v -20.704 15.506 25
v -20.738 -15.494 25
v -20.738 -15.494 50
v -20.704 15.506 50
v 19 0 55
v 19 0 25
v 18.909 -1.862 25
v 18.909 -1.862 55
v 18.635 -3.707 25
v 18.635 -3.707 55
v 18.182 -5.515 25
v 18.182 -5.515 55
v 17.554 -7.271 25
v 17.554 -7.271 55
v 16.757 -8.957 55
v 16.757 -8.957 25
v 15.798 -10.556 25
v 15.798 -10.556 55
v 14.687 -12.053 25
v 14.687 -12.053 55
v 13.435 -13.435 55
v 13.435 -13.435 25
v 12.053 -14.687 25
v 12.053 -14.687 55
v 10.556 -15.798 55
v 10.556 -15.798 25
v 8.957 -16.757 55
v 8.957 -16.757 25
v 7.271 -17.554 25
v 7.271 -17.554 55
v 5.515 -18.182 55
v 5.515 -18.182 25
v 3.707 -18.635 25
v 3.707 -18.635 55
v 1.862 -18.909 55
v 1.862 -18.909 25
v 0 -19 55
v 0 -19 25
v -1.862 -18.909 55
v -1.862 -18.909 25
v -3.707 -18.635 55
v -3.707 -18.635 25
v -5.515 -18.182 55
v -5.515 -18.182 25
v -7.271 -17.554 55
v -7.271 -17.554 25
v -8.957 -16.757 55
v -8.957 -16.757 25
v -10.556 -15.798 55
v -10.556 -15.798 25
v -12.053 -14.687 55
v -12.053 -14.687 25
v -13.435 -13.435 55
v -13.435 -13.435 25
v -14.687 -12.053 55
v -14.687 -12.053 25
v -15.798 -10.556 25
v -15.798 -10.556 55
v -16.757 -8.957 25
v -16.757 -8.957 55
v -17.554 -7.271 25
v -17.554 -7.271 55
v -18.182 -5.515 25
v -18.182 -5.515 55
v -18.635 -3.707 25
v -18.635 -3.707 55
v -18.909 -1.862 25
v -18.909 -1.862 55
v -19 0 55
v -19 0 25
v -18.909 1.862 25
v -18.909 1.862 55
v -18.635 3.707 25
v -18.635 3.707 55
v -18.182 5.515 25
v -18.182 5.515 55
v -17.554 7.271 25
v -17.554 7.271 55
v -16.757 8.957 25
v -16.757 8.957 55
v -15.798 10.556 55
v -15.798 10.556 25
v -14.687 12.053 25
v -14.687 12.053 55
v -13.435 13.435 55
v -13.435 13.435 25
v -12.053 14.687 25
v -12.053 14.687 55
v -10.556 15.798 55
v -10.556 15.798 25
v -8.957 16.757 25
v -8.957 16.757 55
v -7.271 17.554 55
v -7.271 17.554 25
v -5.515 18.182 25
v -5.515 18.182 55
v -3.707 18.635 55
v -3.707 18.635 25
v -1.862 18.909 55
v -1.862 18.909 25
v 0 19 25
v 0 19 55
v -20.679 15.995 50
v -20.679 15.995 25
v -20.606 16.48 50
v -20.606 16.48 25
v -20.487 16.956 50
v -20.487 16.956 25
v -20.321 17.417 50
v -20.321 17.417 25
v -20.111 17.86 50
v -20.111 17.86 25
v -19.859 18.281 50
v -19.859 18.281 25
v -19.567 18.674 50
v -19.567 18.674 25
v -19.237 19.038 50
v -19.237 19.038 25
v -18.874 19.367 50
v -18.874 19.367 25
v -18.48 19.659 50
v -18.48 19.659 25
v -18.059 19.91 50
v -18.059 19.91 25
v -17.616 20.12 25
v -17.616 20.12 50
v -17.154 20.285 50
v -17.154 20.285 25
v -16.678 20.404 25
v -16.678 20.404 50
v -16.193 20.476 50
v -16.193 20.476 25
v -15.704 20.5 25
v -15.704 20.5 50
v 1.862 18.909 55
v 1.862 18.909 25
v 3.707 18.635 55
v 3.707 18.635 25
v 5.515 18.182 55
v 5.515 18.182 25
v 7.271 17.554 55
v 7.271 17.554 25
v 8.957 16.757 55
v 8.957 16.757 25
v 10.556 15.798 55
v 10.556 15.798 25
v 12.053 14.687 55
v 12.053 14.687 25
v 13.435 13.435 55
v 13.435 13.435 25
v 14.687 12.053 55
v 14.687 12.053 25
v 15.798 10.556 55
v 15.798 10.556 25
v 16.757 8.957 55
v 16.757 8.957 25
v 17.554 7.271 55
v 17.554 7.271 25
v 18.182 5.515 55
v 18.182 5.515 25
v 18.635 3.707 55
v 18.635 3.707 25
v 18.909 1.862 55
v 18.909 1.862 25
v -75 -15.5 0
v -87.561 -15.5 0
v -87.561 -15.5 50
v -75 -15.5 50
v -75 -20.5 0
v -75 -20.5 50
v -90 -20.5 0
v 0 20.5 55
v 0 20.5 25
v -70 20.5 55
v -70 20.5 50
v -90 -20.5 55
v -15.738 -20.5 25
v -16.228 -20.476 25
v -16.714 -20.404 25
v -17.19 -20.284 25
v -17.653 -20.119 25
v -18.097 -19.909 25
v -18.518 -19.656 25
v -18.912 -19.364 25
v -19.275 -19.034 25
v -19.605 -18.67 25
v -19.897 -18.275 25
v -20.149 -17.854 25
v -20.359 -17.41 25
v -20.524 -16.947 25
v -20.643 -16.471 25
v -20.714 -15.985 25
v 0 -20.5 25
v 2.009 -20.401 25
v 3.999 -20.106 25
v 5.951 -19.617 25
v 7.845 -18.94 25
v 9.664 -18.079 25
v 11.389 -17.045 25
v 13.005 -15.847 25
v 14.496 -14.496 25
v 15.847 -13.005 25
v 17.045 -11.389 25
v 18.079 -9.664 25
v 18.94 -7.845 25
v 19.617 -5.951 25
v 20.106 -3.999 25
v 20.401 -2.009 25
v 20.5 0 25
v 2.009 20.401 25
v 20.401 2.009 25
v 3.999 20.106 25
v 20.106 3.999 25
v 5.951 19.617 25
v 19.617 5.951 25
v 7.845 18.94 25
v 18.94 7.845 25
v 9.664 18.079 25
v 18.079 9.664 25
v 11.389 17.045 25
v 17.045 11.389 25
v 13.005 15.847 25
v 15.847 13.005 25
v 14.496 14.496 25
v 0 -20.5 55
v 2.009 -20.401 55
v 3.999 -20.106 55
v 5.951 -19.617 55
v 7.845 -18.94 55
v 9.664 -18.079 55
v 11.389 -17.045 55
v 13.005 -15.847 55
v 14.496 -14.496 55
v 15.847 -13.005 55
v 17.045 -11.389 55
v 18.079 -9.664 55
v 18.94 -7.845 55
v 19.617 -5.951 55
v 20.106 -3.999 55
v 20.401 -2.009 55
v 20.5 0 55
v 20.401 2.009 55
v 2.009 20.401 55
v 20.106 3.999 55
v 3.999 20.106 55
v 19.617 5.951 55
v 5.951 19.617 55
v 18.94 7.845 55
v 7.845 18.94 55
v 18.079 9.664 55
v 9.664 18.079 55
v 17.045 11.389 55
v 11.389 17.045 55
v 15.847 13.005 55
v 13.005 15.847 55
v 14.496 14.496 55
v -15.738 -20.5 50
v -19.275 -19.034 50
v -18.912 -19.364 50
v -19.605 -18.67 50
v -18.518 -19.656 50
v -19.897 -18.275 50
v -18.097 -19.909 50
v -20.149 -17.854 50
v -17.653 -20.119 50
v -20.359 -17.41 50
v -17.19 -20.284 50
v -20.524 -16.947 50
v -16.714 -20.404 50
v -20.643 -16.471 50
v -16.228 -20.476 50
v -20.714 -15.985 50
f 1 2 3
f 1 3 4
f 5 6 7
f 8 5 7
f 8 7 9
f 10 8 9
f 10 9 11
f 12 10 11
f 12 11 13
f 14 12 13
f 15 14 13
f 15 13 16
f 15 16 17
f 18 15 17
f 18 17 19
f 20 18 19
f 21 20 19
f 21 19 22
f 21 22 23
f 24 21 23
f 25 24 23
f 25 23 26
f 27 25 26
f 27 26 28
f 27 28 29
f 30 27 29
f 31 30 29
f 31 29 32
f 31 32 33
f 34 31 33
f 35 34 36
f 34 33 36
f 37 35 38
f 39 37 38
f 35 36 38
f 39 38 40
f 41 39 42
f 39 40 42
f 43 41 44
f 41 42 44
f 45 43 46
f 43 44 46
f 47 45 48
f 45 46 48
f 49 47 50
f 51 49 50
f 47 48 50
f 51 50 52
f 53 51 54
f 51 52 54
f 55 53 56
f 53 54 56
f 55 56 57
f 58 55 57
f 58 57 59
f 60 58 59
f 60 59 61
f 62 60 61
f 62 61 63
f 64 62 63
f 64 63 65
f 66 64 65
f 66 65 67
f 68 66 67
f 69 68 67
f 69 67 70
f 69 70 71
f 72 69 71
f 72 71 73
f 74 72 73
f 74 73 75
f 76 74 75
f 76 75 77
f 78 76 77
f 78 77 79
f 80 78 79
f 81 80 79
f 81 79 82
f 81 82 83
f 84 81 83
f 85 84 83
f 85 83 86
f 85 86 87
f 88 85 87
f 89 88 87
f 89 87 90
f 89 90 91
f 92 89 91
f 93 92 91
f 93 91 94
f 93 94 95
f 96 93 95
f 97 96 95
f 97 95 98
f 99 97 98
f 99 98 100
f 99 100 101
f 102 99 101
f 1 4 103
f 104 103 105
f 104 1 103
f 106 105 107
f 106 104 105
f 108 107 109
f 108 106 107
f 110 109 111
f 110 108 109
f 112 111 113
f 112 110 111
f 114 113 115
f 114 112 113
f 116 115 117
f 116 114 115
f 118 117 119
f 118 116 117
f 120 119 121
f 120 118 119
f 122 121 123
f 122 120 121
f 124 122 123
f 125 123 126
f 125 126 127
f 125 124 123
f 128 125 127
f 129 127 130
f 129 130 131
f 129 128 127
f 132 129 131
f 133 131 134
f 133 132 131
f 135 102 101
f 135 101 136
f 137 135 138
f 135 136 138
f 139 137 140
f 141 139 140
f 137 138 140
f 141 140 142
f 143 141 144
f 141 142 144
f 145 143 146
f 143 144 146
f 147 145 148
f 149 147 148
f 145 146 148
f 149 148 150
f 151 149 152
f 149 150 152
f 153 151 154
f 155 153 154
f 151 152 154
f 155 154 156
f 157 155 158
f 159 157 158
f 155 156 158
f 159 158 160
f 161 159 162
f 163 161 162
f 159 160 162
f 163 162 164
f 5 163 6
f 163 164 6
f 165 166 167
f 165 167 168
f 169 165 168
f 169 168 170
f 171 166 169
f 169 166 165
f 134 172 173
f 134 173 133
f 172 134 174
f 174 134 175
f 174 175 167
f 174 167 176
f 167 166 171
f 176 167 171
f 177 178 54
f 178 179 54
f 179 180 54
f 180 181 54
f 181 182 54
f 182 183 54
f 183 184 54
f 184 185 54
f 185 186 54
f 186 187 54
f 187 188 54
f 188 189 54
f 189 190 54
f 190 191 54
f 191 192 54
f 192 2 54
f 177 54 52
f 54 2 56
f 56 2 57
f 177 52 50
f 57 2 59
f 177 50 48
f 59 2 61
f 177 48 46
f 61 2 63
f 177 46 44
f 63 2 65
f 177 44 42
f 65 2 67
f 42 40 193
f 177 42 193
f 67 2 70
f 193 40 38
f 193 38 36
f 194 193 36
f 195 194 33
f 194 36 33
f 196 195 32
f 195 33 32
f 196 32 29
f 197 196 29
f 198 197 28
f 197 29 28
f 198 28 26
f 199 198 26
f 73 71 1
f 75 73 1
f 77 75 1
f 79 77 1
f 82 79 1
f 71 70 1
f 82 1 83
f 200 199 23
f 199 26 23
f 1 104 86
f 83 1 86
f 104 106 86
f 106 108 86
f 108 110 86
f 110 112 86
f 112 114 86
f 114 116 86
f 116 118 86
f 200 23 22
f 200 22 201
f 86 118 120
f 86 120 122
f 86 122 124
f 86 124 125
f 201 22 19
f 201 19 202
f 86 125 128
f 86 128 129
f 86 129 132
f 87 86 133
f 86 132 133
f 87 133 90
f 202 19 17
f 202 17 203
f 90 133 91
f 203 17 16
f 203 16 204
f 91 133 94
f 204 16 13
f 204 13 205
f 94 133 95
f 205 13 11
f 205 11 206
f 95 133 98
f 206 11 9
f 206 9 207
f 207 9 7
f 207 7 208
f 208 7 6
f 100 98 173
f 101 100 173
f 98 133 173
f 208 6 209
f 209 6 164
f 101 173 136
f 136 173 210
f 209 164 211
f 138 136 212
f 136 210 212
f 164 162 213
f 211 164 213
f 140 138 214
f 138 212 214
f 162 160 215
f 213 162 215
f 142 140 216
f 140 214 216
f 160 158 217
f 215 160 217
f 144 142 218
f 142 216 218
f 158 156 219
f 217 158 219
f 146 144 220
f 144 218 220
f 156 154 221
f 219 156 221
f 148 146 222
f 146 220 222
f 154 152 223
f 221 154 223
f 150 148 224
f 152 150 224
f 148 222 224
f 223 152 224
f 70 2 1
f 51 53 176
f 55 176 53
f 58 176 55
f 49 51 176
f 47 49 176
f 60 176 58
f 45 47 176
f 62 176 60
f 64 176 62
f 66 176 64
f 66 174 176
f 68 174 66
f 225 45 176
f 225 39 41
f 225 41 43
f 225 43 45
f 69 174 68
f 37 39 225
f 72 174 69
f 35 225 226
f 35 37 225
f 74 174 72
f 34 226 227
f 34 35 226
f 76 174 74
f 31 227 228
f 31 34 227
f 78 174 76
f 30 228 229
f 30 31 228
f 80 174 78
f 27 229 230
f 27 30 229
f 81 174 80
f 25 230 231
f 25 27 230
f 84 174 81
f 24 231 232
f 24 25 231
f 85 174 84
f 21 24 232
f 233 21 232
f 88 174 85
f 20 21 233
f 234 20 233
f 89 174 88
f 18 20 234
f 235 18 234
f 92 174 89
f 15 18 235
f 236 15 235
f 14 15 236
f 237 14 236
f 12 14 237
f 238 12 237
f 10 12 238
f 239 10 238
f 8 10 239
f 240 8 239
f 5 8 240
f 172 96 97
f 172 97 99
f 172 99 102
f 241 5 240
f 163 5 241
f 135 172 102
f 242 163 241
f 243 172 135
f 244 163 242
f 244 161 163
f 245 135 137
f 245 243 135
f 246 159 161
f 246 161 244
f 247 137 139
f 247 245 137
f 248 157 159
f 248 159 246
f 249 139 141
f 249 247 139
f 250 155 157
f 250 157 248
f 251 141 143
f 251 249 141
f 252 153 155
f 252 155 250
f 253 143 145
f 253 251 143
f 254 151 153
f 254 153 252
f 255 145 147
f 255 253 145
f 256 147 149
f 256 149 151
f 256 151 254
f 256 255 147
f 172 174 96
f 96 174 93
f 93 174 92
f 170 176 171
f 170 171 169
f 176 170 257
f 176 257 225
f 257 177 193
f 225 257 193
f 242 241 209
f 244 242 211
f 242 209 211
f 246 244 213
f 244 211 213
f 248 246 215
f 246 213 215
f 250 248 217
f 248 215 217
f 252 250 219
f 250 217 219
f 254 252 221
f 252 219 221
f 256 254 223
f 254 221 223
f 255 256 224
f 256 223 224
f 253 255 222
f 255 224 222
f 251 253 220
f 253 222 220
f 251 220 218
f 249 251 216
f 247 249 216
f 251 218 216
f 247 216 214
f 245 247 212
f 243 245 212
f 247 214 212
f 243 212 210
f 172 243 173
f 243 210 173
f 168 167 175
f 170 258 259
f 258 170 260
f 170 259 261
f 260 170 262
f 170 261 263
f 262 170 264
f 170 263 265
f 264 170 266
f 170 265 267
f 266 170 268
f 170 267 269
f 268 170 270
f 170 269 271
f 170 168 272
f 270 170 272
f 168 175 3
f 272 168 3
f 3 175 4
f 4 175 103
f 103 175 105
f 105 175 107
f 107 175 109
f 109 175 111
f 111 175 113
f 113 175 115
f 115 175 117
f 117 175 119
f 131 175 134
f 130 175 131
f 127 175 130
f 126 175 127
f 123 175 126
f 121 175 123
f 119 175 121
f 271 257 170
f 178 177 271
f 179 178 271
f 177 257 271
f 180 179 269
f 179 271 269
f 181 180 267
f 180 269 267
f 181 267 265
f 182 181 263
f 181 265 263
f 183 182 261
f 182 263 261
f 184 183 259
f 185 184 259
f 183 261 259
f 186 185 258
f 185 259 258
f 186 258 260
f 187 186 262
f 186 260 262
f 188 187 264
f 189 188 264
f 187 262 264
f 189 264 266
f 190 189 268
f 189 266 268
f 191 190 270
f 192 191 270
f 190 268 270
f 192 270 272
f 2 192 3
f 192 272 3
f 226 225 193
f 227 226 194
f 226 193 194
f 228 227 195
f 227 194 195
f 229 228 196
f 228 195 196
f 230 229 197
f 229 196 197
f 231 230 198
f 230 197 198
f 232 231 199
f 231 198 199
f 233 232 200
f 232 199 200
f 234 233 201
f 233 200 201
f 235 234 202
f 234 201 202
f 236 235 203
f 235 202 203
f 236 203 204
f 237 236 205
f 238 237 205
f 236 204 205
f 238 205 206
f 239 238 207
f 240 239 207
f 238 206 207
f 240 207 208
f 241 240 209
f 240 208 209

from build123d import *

# Parameters (mm, degrees)
F1_DEPTH = 55
F3_DEPTH = 50
F4_W     = 46.665443
F4_H     = 57.836632
F5_DEPTH = 25
F6_R     = 5


with BuildPart() as f1:
    # F0 (on Top) → F1 (new body)
    with BuildSketch(Plane.XY):
        with BuildLine():
            ThreePointArc((19, 0), (13.435029, 13.435029), (0, 19))
            ThreePointArc((0, 19), (-13.435029, -13.435029), (19, 0))
        make_face()
        with BuildLine():
            ThreePointArc((0, -20.5), (14.495689, -14.495689), (20.5, 0))
            ThreePointArc((20.5, 0), (14.495689, 14.495689), (0, 20.5))
            ThreePointArc((0, 20.5), (-20.5, 0), (0, -20.5))
        make_face()
        with BuildLine():
            ThreePointArc((19, 0), (-13.435029, -13.435029), (0, 19))
            ThreePointArc((0, 19), (13.435029, 13.435029), (19, 0))
        make_face(mode=Mode.SUBTRACT)
        with BuildLine():
            ThreePointArc((0, -20.5), (-20.5, 0), (0, 20.5))
            Line((0, 20.5), (-70, 20.5))
            Line((-70, 20.5), (-90, -20.5))
            Line((-90, -20.5), (0, -20.5))
        make_face()
    extrude(amount=F1_DEPTH)

    # F2 (on face) → F3 (cut)
    with BuildSketch(Plane.XY):
        Polygon((-20.693906, 24.132871), (-92.302133, 24.132871), (-92.683225, -15.5), (-75, -15.5), (-75, -22.003565), (-20.745235, -22.003565), align=None)
    extrude(amount=F3_DEPTH, mode=Mode.SUBTRACT)

    # F4 (on face) → F5 (cut)
    with BuildSketch(Plane.XY):
        with Locations((-0.75581, 1.738093)):
            Rectangle(F4_W, F4_H)
    extrude(amount=F5_DEPTH, mode=Mode.SUBTRACT)

    # F6
    f6_edges = [f1.edges().sort_by_distance(p)[0] for p in [
        (-20.697947, 20.5, 37.5),
        (-20.743562, -20.5, 37.5),
    ]]
    fillet(f6_edges, radius=F6_R)


solid = f1.part
